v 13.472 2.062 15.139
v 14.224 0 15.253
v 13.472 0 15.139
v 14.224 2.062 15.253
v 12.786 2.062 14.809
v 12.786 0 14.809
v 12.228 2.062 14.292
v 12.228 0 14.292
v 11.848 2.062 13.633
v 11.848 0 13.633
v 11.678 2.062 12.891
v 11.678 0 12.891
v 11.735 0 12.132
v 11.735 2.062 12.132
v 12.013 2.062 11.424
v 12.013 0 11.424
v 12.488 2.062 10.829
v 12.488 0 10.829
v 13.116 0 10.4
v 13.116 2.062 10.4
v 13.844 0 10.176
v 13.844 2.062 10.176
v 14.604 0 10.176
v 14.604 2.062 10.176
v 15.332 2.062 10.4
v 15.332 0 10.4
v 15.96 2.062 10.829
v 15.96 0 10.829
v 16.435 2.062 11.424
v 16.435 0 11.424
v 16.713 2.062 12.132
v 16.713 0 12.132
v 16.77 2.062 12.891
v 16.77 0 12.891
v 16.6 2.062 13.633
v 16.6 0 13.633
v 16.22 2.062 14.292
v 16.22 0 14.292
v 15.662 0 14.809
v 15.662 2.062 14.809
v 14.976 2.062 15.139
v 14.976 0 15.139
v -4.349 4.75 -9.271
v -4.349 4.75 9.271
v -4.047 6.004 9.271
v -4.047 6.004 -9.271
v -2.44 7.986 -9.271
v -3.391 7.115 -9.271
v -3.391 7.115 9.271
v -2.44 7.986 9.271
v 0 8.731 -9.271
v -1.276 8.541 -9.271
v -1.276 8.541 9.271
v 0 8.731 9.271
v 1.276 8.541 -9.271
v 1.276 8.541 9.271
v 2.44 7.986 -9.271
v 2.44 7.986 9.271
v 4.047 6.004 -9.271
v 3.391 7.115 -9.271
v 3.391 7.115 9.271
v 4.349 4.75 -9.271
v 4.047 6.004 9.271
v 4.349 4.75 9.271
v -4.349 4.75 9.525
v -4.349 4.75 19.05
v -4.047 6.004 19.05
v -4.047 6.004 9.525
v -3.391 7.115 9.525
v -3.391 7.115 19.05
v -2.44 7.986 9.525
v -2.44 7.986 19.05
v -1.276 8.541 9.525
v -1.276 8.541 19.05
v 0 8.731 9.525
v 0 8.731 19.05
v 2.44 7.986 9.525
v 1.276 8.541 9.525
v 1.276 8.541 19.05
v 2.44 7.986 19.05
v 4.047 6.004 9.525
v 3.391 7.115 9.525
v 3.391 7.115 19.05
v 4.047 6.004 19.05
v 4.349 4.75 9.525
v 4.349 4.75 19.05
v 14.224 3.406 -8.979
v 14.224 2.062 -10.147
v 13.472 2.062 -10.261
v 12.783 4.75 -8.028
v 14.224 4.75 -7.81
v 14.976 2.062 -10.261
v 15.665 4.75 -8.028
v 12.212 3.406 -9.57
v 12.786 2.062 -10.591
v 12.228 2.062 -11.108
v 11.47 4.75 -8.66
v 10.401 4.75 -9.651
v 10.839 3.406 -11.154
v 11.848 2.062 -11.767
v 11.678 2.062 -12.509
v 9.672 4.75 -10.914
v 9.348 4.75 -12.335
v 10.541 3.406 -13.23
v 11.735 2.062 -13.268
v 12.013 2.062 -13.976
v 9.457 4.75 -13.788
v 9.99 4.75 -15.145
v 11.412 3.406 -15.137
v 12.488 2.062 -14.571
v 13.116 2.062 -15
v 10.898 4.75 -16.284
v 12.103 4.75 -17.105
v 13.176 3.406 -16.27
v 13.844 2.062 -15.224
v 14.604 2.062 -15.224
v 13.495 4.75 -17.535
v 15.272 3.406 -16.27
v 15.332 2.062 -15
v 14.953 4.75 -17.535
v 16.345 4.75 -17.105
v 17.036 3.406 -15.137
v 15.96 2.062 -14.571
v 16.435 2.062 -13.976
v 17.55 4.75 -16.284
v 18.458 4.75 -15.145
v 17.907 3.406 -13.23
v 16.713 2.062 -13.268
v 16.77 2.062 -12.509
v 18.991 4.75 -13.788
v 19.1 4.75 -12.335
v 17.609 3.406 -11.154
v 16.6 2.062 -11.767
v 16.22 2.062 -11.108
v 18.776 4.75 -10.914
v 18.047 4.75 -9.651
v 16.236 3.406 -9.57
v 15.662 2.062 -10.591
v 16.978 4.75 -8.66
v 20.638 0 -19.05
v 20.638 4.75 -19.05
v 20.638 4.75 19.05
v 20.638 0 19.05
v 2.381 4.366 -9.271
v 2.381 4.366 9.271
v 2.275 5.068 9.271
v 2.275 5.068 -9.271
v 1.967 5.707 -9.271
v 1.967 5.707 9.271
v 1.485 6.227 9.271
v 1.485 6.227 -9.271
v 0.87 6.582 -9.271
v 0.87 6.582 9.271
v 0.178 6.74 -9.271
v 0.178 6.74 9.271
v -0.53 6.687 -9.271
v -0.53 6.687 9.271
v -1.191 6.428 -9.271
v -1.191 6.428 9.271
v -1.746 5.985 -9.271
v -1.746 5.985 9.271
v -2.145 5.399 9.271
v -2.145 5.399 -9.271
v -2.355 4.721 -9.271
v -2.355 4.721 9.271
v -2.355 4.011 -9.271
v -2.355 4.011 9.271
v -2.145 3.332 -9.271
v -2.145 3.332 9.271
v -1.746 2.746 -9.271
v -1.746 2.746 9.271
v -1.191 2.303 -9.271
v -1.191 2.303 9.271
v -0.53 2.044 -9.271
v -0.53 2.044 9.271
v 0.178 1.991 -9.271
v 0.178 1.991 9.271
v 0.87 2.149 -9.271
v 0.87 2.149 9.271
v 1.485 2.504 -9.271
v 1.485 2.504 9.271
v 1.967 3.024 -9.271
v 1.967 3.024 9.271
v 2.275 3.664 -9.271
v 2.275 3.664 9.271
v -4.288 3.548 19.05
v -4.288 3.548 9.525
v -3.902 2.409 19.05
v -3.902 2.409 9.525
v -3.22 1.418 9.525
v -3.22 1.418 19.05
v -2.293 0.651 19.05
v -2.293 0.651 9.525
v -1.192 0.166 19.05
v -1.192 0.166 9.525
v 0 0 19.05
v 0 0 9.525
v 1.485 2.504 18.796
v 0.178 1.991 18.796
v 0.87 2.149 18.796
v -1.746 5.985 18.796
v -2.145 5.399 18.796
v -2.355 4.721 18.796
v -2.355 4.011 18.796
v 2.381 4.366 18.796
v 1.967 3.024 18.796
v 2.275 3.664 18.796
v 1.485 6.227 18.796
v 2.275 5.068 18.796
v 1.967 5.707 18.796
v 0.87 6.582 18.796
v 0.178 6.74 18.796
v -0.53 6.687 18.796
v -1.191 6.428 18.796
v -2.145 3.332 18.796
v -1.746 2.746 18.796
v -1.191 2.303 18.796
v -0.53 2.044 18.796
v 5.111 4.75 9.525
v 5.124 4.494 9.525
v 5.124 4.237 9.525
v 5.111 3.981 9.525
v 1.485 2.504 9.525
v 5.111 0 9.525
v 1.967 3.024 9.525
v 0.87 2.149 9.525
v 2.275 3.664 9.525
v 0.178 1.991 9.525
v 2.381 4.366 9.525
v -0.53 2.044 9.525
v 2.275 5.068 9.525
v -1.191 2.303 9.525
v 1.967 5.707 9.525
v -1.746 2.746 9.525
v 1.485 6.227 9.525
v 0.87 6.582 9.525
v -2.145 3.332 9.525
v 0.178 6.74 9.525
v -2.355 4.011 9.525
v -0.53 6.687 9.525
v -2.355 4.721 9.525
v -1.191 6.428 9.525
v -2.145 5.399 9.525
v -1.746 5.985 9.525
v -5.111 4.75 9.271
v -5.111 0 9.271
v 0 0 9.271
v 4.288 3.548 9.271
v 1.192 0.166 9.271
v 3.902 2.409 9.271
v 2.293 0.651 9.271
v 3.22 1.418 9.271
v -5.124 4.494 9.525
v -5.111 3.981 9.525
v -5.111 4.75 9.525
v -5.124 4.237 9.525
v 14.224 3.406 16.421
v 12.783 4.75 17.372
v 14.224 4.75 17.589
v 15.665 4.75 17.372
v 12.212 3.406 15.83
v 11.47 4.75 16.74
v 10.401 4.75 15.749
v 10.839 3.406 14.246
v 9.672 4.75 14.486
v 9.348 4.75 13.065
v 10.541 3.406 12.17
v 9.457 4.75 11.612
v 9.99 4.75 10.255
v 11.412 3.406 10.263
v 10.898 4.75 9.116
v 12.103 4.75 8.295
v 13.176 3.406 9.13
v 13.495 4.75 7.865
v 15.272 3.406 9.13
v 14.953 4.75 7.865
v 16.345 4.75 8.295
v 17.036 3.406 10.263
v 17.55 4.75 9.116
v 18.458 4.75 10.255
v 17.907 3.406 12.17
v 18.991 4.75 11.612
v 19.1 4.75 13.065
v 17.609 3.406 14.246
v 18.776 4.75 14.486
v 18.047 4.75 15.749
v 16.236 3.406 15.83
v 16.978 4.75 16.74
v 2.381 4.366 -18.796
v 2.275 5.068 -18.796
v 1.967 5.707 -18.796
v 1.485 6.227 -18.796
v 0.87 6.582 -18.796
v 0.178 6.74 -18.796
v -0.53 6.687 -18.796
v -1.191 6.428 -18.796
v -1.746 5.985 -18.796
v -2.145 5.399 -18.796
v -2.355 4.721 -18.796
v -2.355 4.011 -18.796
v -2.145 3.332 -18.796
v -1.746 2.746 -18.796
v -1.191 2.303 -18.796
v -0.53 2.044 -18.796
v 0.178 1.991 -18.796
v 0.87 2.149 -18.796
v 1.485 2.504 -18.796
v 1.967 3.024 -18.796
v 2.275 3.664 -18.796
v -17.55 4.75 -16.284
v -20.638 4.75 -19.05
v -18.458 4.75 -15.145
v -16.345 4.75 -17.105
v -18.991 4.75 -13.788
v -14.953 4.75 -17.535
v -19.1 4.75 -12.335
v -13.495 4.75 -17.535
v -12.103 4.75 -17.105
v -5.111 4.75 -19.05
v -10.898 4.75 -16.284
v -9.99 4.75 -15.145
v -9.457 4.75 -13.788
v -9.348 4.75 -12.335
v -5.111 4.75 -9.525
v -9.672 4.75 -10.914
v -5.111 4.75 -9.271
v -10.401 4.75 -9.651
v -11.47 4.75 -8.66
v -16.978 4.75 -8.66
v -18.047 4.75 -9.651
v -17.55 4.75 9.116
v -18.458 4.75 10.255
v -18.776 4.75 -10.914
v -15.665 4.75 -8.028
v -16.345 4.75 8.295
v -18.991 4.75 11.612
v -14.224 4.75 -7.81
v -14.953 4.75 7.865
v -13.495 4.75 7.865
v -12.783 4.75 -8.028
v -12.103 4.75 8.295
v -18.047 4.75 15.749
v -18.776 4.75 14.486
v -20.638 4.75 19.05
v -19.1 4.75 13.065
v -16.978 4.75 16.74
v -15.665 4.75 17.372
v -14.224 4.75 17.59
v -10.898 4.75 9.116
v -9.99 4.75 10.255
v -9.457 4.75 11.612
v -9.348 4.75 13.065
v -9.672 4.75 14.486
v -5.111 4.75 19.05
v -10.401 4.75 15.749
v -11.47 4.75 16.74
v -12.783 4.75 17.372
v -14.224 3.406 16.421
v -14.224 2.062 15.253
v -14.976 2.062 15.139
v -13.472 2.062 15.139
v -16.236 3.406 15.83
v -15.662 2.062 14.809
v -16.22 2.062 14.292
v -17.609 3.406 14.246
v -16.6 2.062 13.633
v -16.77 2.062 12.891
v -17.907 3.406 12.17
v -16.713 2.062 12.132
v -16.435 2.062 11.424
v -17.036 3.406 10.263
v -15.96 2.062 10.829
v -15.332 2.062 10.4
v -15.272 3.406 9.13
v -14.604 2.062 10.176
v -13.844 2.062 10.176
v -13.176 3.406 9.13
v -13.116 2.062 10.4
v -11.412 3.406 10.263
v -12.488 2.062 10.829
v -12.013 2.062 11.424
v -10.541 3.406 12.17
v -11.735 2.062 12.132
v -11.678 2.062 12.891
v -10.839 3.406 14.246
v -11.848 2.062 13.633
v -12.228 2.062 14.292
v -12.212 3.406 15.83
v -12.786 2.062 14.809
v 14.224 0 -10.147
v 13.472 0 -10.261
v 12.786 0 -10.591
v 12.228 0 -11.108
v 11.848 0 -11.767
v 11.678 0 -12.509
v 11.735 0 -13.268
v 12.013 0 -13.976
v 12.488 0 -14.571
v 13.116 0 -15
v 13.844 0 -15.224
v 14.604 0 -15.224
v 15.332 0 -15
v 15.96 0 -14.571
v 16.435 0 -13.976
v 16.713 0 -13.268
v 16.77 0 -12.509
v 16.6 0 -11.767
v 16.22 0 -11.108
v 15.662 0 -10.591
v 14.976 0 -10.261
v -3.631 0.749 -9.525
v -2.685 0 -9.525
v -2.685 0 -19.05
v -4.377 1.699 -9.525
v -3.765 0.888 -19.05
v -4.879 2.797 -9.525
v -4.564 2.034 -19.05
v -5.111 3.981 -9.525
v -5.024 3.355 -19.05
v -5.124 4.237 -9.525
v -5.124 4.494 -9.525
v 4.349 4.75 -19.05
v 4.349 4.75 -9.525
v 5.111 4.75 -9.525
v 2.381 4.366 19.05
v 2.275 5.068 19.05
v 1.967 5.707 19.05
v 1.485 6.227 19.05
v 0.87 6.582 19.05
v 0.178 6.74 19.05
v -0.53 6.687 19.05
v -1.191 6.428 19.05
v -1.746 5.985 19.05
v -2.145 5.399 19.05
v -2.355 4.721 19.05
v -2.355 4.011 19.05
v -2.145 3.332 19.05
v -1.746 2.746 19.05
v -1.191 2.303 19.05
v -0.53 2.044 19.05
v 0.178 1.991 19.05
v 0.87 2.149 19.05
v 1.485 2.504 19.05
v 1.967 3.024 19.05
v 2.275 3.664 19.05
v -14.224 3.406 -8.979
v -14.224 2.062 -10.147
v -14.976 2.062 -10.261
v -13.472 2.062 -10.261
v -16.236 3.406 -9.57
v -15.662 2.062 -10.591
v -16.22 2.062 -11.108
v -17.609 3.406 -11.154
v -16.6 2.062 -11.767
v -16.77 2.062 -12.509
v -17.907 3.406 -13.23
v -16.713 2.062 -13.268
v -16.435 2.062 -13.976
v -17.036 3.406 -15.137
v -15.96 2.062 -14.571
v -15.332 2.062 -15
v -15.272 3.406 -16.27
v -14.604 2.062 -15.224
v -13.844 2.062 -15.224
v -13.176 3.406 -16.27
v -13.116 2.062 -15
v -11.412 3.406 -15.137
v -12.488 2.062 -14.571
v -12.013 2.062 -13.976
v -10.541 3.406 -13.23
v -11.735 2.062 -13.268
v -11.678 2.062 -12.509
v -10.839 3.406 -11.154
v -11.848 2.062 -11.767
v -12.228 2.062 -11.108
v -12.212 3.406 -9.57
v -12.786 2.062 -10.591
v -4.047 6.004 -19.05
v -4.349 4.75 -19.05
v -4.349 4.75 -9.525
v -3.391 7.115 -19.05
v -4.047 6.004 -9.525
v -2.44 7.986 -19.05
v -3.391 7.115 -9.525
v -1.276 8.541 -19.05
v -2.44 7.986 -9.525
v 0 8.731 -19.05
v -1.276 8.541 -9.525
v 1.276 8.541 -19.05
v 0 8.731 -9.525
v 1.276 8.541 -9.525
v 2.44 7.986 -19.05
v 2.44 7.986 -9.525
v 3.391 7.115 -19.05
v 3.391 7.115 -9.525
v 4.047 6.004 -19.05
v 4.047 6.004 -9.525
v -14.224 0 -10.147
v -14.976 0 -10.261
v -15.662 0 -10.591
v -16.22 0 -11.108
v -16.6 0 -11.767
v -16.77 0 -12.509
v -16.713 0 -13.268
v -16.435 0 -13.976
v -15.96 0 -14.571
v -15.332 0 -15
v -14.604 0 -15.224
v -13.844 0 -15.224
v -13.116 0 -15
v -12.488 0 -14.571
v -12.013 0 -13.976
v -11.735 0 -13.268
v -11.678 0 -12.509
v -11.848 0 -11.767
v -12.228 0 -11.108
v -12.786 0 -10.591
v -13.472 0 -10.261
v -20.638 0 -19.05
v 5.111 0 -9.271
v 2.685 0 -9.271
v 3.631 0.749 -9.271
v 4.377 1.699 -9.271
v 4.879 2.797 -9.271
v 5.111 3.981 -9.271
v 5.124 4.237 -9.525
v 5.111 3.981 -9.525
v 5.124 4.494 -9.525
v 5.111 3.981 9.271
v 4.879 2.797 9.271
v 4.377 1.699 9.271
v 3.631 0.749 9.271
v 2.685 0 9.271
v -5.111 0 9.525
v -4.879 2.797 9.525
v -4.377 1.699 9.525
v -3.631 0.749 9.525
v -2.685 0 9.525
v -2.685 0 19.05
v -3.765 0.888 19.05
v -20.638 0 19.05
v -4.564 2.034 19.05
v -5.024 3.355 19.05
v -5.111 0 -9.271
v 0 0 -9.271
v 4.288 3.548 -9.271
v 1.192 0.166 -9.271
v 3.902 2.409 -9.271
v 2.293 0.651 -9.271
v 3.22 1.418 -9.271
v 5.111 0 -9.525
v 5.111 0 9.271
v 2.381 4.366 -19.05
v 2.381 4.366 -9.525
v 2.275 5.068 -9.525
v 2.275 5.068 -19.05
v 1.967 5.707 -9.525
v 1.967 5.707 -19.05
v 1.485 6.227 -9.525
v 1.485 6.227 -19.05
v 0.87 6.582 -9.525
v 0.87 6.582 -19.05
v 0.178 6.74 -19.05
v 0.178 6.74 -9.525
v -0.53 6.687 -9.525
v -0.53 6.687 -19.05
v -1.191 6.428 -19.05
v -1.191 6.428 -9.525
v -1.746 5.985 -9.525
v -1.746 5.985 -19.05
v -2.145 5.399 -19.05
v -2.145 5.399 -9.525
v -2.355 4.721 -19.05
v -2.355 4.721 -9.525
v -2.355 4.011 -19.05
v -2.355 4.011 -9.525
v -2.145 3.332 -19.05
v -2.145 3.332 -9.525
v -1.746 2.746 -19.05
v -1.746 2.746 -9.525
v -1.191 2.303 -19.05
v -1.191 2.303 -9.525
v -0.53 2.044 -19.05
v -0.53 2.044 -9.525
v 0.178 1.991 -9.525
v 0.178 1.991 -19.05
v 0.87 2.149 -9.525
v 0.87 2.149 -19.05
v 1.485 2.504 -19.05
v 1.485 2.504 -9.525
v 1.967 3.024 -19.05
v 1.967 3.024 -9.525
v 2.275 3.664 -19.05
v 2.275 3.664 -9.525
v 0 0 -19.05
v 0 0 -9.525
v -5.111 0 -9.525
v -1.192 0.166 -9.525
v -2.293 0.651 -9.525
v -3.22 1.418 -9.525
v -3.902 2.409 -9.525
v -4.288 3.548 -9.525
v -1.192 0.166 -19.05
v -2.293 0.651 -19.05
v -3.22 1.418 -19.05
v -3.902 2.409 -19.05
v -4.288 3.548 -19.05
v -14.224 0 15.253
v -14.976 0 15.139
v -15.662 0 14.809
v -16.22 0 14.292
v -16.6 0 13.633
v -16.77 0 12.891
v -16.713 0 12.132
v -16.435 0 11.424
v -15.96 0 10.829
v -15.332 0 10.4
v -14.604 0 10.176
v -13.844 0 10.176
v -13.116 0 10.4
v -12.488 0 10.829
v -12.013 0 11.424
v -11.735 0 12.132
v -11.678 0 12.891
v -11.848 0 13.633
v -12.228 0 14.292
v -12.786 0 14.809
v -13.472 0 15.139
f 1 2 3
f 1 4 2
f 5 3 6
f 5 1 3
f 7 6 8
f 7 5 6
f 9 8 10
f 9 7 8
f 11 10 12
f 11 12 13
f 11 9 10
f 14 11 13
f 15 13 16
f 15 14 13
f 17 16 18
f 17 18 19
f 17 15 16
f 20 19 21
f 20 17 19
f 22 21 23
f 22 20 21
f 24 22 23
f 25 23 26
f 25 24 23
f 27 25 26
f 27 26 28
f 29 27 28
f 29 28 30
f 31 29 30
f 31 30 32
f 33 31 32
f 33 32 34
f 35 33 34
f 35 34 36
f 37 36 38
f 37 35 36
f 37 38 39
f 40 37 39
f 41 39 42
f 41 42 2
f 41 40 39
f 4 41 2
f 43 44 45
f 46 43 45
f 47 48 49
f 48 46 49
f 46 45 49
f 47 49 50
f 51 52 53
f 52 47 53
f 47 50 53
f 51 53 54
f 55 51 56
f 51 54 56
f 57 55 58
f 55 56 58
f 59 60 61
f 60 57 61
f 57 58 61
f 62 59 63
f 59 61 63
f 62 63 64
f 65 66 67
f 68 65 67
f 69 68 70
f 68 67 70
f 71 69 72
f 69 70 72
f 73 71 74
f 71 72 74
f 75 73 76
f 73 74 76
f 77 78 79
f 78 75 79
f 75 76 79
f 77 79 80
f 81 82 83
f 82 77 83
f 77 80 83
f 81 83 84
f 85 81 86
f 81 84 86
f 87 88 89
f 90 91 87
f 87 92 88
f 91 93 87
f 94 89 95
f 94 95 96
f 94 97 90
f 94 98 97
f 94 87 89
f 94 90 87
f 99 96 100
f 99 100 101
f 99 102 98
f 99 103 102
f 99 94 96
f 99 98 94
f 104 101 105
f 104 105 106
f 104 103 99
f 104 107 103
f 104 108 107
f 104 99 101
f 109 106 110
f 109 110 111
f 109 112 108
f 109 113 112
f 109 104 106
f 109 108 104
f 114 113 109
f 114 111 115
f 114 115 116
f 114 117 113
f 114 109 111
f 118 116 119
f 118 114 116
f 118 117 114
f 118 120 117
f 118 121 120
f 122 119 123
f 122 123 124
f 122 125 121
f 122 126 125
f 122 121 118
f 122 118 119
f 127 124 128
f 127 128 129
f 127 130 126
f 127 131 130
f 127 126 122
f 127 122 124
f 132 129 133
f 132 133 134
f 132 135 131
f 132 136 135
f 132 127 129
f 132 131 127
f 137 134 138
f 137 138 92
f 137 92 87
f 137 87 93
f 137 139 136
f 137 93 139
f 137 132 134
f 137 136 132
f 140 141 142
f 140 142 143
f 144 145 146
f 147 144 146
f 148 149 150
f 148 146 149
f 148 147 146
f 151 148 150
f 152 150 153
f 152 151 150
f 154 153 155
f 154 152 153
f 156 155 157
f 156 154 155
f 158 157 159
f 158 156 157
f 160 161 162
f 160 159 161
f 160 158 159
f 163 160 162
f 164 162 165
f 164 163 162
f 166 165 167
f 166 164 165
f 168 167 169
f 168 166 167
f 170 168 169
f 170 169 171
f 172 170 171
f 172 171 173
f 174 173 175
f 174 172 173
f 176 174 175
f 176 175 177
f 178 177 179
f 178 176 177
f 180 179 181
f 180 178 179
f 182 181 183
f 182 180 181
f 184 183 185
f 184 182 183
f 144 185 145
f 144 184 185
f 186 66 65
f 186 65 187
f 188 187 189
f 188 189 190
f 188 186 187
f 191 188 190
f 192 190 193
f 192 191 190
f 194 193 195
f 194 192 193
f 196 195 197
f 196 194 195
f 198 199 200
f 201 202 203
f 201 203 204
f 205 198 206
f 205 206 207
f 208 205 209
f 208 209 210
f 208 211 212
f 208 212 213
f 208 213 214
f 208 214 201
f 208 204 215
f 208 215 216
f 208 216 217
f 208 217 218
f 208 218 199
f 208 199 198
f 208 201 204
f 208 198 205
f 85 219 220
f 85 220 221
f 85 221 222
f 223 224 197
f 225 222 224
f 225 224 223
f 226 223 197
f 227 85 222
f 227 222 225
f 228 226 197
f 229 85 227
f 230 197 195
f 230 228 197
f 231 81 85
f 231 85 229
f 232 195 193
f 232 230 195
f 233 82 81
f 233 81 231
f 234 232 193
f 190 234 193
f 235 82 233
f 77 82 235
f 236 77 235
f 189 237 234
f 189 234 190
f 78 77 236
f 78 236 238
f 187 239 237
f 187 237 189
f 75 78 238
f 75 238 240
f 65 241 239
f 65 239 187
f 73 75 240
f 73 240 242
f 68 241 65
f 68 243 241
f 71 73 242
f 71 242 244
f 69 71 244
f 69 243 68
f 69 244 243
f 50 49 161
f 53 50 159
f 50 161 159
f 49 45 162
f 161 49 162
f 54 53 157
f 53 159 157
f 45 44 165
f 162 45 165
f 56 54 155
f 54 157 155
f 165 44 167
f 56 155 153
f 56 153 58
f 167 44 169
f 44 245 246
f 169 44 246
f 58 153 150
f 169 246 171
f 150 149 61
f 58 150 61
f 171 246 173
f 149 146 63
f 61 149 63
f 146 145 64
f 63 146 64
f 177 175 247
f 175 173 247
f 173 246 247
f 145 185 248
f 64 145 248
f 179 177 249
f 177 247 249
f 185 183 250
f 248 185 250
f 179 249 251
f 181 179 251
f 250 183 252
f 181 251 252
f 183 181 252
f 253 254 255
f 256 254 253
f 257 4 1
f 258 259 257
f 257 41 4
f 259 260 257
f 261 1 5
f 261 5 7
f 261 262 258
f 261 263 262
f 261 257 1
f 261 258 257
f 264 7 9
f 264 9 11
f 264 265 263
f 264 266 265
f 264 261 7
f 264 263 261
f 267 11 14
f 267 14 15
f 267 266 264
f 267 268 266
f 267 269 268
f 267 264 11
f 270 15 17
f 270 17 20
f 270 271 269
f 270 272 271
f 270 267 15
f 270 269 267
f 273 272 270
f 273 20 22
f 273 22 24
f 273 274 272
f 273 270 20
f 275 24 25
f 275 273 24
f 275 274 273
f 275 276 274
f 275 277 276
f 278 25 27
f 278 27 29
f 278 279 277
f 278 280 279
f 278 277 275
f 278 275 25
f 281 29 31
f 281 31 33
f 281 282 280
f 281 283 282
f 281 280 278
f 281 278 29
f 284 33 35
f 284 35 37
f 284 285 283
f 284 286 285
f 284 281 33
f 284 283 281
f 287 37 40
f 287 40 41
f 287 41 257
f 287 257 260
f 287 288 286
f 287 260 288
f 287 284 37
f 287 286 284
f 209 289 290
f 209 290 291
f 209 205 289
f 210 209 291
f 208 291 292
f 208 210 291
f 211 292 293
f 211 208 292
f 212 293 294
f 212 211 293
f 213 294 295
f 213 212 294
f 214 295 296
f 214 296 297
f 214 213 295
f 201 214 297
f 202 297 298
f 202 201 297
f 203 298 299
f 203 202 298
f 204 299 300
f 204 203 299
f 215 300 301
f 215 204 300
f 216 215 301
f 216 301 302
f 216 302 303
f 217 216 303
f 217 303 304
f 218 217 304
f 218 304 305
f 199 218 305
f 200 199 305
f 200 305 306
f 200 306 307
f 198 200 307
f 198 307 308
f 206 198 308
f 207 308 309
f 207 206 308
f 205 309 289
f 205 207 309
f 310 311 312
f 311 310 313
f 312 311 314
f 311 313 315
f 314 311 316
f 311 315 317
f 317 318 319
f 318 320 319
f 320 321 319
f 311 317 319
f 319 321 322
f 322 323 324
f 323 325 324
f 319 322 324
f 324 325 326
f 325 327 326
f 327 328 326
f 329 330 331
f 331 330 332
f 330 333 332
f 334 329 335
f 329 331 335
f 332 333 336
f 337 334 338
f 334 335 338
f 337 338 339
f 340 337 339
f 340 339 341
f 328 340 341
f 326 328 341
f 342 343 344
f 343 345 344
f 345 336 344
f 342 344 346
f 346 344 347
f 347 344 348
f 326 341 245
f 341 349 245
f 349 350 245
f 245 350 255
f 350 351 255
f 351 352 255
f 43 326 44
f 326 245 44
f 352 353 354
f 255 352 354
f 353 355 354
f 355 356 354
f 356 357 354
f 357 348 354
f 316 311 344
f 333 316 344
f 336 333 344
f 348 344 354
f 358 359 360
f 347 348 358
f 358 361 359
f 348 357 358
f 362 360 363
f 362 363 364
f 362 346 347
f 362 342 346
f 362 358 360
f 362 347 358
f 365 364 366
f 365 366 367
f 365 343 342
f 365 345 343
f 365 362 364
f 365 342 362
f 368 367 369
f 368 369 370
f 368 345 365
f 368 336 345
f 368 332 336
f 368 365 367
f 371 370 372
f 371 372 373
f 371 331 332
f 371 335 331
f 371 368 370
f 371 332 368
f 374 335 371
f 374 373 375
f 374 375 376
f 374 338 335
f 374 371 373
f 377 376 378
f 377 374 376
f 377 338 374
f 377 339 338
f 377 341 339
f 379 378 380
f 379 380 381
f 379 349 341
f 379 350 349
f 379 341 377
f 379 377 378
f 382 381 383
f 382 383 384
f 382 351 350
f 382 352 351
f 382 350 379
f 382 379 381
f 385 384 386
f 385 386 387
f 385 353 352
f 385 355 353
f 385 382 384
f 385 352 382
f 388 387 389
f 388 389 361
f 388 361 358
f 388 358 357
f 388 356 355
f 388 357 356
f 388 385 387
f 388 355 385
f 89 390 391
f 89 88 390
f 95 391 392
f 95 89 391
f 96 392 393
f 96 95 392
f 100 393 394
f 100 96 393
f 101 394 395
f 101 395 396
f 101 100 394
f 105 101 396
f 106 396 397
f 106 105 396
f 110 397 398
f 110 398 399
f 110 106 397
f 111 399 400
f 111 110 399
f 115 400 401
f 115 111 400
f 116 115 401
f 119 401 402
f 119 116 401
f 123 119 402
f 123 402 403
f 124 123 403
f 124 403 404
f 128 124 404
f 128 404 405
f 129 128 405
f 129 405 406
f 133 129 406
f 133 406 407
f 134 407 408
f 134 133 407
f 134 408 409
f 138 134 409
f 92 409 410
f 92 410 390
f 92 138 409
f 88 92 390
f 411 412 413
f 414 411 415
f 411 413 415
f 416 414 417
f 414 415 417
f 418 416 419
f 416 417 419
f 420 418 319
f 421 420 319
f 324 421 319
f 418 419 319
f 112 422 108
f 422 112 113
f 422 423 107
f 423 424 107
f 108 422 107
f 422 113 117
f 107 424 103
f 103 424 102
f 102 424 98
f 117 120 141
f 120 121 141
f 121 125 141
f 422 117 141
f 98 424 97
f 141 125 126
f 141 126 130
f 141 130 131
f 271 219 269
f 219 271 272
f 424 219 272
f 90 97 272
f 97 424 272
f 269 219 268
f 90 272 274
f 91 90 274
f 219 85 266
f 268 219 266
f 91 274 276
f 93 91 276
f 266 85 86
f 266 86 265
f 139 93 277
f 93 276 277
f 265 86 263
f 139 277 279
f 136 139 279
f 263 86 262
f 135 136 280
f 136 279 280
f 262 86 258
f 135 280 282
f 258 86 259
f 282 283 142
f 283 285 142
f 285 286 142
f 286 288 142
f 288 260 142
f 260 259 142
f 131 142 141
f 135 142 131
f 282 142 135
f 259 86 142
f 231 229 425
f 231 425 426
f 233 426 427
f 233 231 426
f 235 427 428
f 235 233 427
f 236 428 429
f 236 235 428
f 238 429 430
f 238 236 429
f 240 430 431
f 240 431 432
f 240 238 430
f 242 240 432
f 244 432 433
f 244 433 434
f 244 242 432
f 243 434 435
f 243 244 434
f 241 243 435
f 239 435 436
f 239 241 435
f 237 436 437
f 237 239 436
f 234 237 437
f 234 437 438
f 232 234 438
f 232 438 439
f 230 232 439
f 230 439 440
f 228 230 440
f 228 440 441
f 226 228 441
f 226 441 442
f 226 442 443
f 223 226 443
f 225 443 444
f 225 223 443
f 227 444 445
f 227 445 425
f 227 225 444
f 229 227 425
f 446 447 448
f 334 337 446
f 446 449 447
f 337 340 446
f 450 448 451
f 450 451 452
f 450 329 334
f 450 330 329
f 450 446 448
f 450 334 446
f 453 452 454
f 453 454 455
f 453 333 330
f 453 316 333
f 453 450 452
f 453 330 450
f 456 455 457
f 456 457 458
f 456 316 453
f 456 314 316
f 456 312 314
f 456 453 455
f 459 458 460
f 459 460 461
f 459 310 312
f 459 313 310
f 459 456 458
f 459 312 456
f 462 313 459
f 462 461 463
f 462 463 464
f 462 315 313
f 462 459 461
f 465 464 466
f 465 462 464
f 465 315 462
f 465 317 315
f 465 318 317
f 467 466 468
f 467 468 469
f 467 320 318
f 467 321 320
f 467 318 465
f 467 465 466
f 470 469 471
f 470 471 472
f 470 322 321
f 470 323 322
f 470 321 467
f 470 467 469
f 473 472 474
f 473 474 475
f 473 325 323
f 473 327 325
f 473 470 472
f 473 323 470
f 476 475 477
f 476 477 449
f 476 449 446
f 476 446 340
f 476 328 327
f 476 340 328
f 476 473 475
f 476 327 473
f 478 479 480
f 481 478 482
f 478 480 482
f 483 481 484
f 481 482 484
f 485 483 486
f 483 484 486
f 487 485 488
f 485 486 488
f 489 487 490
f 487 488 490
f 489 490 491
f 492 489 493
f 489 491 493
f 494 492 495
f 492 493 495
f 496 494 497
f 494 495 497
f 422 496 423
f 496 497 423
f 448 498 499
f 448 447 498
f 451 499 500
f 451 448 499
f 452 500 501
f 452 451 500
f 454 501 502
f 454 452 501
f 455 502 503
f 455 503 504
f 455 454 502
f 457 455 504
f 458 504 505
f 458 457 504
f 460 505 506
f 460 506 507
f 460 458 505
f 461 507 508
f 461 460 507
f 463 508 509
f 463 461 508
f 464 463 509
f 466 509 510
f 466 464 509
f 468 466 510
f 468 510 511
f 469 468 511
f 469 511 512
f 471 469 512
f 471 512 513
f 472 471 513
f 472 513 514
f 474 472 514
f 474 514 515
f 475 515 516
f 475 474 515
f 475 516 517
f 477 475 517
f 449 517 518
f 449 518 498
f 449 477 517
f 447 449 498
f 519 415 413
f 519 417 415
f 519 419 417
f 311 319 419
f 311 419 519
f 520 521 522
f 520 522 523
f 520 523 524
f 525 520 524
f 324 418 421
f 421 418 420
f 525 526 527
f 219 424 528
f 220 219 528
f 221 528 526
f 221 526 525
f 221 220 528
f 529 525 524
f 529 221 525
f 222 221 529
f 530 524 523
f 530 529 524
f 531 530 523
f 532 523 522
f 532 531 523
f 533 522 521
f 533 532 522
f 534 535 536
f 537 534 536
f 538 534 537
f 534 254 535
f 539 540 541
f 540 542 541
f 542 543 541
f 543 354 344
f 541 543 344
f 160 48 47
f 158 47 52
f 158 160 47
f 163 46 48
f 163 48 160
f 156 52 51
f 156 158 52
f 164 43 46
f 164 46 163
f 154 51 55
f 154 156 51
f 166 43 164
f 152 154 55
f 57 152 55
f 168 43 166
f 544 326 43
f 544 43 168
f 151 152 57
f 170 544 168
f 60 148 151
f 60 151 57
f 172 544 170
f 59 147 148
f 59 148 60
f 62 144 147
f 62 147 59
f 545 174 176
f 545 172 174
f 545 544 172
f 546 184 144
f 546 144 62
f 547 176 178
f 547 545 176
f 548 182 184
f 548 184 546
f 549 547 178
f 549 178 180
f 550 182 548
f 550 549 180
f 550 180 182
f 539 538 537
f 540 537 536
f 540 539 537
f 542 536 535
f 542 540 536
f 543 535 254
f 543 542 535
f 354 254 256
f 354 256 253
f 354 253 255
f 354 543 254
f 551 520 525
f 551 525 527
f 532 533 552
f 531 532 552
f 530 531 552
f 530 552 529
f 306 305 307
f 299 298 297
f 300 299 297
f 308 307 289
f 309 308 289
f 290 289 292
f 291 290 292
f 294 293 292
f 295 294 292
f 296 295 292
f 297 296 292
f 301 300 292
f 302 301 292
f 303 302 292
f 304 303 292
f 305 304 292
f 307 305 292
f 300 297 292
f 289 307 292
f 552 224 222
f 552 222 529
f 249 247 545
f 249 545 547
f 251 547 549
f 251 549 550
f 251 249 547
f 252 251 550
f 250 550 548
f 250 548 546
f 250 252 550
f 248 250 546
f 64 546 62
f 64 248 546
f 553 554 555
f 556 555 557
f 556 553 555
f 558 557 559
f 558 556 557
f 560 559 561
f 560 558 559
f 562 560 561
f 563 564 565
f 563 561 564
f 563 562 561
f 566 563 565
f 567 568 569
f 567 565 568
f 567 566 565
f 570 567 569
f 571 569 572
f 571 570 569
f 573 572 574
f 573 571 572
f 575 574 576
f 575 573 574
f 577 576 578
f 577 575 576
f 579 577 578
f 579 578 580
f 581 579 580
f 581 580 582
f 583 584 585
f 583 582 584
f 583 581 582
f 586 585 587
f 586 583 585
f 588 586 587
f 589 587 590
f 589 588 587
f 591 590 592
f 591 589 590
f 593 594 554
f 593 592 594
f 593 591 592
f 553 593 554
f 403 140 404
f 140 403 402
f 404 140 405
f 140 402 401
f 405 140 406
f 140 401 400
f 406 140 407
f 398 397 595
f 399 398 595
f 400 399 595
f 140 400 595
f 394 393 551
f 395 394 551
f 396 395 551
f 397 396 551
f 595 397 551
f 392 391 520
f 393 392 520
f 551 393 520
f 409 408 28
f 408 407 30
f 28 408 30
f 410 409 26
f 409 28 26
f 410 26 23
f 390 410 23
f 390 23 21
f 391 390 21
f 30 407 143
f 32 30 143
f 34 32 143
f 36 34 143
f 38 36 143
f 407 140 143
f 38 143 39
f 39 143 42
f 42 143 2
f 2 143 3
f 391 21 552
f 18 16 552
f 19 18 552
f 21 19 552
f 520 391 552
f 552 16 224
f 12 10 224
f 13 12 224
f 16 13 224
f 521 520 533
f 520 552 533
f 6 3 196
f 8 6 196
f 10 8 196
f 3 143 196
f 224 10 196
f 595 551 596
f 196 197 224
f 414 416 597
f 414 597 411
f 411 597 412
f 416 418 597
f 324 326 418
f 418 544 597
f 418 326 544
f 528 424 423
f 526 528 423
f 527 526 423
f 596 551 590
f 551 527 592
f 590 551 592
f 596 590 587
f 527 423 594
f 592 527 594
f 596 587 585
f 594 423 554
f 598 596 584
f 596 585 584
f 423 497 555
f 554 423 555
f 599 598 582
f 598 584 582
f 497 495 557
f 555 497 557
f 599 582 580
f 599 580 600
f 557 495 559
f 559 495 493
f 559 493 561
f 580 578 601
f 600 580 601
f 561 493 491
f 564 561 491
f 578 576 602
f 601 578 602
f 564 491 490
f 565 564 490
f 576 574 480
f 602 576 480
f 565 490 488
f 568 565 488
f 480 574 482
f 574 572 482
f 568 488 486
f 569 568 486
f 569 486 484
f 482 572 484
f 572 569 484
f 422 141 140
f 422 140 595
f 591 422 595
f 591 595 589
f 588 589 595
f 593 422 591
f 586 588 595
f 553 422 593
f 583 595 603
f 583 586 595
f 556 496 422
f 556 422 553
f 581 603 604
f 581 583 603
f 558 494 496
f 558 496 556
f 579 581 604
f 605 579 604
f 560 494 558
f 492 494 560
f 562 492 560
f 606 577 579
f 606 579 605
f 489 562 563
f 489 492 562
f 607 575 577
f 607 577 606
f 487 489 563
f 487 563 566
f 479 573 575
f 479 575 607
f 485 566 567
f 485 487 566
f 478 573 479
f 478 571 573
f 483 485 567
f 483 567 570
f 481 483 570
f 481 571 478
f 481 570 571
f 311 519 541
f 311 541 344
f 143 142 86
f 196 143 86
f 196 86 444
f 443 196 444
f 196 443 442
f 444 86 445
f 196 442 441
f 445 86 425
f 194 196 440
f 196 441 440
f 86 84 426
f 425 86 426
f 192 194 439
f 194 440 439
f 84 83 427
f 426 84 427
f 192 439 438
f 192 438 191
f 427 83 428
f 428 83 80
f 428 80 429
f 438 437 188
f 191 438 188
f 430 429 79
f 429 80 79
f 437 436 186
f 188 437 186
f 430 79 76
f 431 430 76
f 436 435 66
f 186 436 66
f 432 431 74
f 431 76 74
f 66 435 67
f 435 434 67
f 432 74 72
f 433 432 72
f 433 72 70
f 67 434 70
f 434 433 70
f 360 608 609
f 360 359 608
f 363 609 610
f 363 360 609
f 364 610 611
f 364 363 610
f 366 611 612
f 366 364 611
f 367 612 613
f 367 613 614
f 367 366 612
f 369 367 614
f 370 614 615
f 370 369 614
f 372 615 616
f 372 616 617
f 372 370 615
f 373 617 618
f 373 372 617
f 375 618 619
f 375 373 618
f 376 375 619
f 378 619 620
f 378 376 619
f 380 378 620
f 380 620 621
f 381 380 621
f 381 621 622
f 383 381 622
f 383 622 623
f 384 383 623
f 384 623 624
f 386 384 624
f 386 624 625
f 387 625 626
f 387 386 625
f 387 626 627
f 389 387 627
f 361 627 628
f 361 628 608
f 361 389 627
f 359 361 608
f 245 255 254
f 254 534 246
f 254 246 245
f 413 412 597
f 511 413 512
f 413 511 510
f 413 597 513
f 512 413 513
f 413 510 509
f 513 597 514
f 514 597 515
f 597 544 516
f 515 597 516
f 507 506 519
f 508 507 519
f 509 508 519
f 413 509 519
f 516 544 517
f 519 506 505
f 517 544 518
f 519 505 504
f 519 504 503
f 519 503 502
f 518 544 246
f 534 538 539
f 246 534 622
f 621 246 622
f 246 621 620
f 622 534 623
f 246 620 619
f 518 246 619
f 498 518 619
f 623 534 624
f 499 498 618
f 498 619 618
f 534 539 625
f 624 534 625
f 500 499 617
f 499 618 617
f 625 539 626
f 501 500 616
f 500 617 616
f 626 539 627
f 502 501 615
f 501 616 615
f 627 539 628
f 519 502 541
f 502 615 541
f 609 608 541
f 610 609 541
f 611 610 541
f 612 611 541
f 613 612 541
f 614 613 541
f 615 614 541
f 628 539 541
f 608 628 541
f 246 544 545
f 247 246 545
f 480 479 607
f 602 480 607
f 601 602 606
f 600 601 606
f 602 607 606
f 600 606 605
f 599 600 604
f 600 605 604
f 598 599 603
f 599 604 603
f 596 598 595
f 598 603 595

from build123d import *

# Parameters (mm, degrees)
SKETCH1_R                                    = 2.38125
EXTRUDE1_DEPTH                               = 19.05
CUT_EXTRUDE1_DEPTH                           = 9.525
CUT_EXTRUDE2_DEPTH                           = 9.525
SKETCH4_W                                    = 10.221376894
SKETCH4_H                                    = 0.254
CUT_EXTRUDE4_DEPTH                           = 9.73125
SKETCH5_R                                    = 2.38125
EXTRUDE2_DEPTH                               = 18.796
CSK_FOR_10_FLAT_HEAD_MACHINE_SCREW1_AT_COUNT = 2
CSK_FOR_10_FLAT_HEAD_MACHINE_SCREW1_AT_PITCH = 25.4
CSK_FOR_10_FLAT_HEAD_MACHINE_SCREW1_2_COUNT  = 2
CSK_FOR_10_FLAT_HEAD_MACHINE_SCREW1_2_PITCH  = 38.137235138
CSK_FOR_10_FLAT_HEAD_MACHINE_SCREW1_3_COUNT  = 2
CSK_FOR_10_FLAT_HEAD_MACHINE_SCREW1_3_PITCH  = 28.448


with BuildPart() as part:
    # Sketch1 → Extrude1 (new body, symmetric)
    with BuildSketch(Plane.XY):
        with BuildLine():
            Line((4.348688447, 4.7498), (20.6375, 4.7498))
            Line((20.6375, 4.7498), (20.6375, 0))
            Line((20.6375, 0), (-20.6375, 0))
            Line((-20.6375, 0), (-20.6375, 4.7498))
            Line((-20.6375, 4.7498), (-4.348688447, 4.7498))
            ThreePointArc((-4.348688447, 4.7498), (0, 8.73125), (4.348688447, 4.7498))
        make_face()
        with Locations((0, 4.365625)):
            Circle(SKETCH1_R, mode=Mode.SUBTRACT)
    extrude(amount=EXTRUDE1_DEPTH, both=True)

    # Sketch2 → Cut-Extrude1 (cut)
    with BuildSketch(Plane.XY.offset(19.05)):
        with BuildLine():
            Line((-5.110688447, 4.7498), (-4.348688447, 4.7498))
            ThreePointArc((-4.348688447, 4.7498), (-3.219925902, 1.417615701), (0, 0))
            Line((0, 0), (-2.684780288, 0))
            ThreePointArc((-2.684780288, 0), (-4.564261518, 2.034478581), (-5.110688447, 4.7498))
        make_face()
    cut_extrude1 = extrude(amount=-CUT_EXTRUDE1_DEPTH, mode=Mode.SUBTRACT)

    # Mirror1: Cut-Extrude1 across plane
    add(cut_extrude1.mirror(Plane.XY), mode=Mode.SUBTRACT)

    # Sketch3 → Cut-Extrude2 (cut, symmetric)
    with BuildSketch(Plane.XY):
        with BuildLine():
            Line((4.348688447, 4.7498), (5.110688447, 4.7498))
            ThreePointArc((5.110688447, 4.7498), (4.564261518, 2.034478581), (2.684780288, 0))
            Line((2.684780288, 0), (0, 0))
            ThreePointArc((0, 0), (3.219925902, 1.417615701), (4.348688447, 4.7498))
        make_face()
    extrude(amount=CUT_EXTRUDE2_DEPTH, both=True, mode=Mode.SUBTRACT)

    # Sketch4 → Cut-Extrude4 (cut, through all)
    with BuildSketch(Plane(origin=(0, 0, 0), x_dir=(1, 0, 0), z_dir=(0, 1, 0))):
        with Locations((0, 9.398)):
            Rectangle(SKETCH4_W, SKETCH4_H)
        with Locations((0, -9.398)):
            Rectangle(SKETCH4_W, SKETCH4_H)
    extrude(amount=CUT_EXTRUDE4_DEPTH, mode=Mode.SUBTRACT)

    # Sketch6 → CSK for #10 Flat Head Machine Screw1 (revolve, cut)
    with BuildSketch(Plane(origin=(-14.224, 4.7498, -12.7), x_dir=(0, 0, 1), z_dir=(1, 0, 0))):
        Polygon((0, 0), (0, 4.7498), (2.5527, 4.7498), (2.5527, 2.688180894), (4.8895, 0), align=None)
    csk_for_10_flat_head_machine_screw1 = revolve(axis=Axis((-14.224, 11.0998, -12.7), (0, -1, 0)), mode=Mode.SUBTRACT)

    # CSK for #10 Flat Head Machine Screw1 at: CSK for #10 Flat Head Machine Screw1 ×2
    with Locations(*[(0, 0, i * CSK_FOR_10_FLAT_HEAD_MACHINE_SCREW1_AT_PITCH) for i in range(1, CSK_FOR_10_FLAT_HEAD_MACHINE_SCREW1_AT_COUNT)]):
        add(csk_for_10_flat_head_machine_screw1, mode=Mode.SUBTRACT)

    # CSK for _10 Flat Head Machine Screw1 2: CSK for #10 Flat Head Machine Screw1 ×2
    with Locations(*[Vector(0.745937662, 0, 0.666015769) * (i * CSK_FOR_10_FLAT_HEAD_MACHINE_SCREW1_2_PITCH) for i in range(1, CSK_FOR_10_FLAT_HEAD_MACHINE_SCREW1_2_COUNT)]):
        add(csk_for_10_flat_head_machine_screw1, mode=Mode.SUBTRACT)

    # CSK for _10 Flat Head Machine Screw1 3: CSK for #10 Flat Head Machine Screw1 ×2
    with Locations(*[(i * CSK_FOR_10_FLAT_HEAD_MACHINE_SCREW1_3_PITCH, 0, 0) for i in range(1, CSK_FOR_10_FLAT_HEAD_MACHINE_SCREW1_3_COUNT)]):
        add(csk_for_10_flat_head_machine_screw1, mode=Mode.SUBTRACT)


with BuildPart() as body_2:
    # Sketch5 → Extrude2 (new body, symmetric)
    with BuildSketch(Plane.XY):
        with Locations((0, 4.365625)):
            Circle(SKETCH5_R)
    extrude(amount=EXTRUDE2_DEPTH, both=True)


solid = Compound([part.part, body_2.part])
